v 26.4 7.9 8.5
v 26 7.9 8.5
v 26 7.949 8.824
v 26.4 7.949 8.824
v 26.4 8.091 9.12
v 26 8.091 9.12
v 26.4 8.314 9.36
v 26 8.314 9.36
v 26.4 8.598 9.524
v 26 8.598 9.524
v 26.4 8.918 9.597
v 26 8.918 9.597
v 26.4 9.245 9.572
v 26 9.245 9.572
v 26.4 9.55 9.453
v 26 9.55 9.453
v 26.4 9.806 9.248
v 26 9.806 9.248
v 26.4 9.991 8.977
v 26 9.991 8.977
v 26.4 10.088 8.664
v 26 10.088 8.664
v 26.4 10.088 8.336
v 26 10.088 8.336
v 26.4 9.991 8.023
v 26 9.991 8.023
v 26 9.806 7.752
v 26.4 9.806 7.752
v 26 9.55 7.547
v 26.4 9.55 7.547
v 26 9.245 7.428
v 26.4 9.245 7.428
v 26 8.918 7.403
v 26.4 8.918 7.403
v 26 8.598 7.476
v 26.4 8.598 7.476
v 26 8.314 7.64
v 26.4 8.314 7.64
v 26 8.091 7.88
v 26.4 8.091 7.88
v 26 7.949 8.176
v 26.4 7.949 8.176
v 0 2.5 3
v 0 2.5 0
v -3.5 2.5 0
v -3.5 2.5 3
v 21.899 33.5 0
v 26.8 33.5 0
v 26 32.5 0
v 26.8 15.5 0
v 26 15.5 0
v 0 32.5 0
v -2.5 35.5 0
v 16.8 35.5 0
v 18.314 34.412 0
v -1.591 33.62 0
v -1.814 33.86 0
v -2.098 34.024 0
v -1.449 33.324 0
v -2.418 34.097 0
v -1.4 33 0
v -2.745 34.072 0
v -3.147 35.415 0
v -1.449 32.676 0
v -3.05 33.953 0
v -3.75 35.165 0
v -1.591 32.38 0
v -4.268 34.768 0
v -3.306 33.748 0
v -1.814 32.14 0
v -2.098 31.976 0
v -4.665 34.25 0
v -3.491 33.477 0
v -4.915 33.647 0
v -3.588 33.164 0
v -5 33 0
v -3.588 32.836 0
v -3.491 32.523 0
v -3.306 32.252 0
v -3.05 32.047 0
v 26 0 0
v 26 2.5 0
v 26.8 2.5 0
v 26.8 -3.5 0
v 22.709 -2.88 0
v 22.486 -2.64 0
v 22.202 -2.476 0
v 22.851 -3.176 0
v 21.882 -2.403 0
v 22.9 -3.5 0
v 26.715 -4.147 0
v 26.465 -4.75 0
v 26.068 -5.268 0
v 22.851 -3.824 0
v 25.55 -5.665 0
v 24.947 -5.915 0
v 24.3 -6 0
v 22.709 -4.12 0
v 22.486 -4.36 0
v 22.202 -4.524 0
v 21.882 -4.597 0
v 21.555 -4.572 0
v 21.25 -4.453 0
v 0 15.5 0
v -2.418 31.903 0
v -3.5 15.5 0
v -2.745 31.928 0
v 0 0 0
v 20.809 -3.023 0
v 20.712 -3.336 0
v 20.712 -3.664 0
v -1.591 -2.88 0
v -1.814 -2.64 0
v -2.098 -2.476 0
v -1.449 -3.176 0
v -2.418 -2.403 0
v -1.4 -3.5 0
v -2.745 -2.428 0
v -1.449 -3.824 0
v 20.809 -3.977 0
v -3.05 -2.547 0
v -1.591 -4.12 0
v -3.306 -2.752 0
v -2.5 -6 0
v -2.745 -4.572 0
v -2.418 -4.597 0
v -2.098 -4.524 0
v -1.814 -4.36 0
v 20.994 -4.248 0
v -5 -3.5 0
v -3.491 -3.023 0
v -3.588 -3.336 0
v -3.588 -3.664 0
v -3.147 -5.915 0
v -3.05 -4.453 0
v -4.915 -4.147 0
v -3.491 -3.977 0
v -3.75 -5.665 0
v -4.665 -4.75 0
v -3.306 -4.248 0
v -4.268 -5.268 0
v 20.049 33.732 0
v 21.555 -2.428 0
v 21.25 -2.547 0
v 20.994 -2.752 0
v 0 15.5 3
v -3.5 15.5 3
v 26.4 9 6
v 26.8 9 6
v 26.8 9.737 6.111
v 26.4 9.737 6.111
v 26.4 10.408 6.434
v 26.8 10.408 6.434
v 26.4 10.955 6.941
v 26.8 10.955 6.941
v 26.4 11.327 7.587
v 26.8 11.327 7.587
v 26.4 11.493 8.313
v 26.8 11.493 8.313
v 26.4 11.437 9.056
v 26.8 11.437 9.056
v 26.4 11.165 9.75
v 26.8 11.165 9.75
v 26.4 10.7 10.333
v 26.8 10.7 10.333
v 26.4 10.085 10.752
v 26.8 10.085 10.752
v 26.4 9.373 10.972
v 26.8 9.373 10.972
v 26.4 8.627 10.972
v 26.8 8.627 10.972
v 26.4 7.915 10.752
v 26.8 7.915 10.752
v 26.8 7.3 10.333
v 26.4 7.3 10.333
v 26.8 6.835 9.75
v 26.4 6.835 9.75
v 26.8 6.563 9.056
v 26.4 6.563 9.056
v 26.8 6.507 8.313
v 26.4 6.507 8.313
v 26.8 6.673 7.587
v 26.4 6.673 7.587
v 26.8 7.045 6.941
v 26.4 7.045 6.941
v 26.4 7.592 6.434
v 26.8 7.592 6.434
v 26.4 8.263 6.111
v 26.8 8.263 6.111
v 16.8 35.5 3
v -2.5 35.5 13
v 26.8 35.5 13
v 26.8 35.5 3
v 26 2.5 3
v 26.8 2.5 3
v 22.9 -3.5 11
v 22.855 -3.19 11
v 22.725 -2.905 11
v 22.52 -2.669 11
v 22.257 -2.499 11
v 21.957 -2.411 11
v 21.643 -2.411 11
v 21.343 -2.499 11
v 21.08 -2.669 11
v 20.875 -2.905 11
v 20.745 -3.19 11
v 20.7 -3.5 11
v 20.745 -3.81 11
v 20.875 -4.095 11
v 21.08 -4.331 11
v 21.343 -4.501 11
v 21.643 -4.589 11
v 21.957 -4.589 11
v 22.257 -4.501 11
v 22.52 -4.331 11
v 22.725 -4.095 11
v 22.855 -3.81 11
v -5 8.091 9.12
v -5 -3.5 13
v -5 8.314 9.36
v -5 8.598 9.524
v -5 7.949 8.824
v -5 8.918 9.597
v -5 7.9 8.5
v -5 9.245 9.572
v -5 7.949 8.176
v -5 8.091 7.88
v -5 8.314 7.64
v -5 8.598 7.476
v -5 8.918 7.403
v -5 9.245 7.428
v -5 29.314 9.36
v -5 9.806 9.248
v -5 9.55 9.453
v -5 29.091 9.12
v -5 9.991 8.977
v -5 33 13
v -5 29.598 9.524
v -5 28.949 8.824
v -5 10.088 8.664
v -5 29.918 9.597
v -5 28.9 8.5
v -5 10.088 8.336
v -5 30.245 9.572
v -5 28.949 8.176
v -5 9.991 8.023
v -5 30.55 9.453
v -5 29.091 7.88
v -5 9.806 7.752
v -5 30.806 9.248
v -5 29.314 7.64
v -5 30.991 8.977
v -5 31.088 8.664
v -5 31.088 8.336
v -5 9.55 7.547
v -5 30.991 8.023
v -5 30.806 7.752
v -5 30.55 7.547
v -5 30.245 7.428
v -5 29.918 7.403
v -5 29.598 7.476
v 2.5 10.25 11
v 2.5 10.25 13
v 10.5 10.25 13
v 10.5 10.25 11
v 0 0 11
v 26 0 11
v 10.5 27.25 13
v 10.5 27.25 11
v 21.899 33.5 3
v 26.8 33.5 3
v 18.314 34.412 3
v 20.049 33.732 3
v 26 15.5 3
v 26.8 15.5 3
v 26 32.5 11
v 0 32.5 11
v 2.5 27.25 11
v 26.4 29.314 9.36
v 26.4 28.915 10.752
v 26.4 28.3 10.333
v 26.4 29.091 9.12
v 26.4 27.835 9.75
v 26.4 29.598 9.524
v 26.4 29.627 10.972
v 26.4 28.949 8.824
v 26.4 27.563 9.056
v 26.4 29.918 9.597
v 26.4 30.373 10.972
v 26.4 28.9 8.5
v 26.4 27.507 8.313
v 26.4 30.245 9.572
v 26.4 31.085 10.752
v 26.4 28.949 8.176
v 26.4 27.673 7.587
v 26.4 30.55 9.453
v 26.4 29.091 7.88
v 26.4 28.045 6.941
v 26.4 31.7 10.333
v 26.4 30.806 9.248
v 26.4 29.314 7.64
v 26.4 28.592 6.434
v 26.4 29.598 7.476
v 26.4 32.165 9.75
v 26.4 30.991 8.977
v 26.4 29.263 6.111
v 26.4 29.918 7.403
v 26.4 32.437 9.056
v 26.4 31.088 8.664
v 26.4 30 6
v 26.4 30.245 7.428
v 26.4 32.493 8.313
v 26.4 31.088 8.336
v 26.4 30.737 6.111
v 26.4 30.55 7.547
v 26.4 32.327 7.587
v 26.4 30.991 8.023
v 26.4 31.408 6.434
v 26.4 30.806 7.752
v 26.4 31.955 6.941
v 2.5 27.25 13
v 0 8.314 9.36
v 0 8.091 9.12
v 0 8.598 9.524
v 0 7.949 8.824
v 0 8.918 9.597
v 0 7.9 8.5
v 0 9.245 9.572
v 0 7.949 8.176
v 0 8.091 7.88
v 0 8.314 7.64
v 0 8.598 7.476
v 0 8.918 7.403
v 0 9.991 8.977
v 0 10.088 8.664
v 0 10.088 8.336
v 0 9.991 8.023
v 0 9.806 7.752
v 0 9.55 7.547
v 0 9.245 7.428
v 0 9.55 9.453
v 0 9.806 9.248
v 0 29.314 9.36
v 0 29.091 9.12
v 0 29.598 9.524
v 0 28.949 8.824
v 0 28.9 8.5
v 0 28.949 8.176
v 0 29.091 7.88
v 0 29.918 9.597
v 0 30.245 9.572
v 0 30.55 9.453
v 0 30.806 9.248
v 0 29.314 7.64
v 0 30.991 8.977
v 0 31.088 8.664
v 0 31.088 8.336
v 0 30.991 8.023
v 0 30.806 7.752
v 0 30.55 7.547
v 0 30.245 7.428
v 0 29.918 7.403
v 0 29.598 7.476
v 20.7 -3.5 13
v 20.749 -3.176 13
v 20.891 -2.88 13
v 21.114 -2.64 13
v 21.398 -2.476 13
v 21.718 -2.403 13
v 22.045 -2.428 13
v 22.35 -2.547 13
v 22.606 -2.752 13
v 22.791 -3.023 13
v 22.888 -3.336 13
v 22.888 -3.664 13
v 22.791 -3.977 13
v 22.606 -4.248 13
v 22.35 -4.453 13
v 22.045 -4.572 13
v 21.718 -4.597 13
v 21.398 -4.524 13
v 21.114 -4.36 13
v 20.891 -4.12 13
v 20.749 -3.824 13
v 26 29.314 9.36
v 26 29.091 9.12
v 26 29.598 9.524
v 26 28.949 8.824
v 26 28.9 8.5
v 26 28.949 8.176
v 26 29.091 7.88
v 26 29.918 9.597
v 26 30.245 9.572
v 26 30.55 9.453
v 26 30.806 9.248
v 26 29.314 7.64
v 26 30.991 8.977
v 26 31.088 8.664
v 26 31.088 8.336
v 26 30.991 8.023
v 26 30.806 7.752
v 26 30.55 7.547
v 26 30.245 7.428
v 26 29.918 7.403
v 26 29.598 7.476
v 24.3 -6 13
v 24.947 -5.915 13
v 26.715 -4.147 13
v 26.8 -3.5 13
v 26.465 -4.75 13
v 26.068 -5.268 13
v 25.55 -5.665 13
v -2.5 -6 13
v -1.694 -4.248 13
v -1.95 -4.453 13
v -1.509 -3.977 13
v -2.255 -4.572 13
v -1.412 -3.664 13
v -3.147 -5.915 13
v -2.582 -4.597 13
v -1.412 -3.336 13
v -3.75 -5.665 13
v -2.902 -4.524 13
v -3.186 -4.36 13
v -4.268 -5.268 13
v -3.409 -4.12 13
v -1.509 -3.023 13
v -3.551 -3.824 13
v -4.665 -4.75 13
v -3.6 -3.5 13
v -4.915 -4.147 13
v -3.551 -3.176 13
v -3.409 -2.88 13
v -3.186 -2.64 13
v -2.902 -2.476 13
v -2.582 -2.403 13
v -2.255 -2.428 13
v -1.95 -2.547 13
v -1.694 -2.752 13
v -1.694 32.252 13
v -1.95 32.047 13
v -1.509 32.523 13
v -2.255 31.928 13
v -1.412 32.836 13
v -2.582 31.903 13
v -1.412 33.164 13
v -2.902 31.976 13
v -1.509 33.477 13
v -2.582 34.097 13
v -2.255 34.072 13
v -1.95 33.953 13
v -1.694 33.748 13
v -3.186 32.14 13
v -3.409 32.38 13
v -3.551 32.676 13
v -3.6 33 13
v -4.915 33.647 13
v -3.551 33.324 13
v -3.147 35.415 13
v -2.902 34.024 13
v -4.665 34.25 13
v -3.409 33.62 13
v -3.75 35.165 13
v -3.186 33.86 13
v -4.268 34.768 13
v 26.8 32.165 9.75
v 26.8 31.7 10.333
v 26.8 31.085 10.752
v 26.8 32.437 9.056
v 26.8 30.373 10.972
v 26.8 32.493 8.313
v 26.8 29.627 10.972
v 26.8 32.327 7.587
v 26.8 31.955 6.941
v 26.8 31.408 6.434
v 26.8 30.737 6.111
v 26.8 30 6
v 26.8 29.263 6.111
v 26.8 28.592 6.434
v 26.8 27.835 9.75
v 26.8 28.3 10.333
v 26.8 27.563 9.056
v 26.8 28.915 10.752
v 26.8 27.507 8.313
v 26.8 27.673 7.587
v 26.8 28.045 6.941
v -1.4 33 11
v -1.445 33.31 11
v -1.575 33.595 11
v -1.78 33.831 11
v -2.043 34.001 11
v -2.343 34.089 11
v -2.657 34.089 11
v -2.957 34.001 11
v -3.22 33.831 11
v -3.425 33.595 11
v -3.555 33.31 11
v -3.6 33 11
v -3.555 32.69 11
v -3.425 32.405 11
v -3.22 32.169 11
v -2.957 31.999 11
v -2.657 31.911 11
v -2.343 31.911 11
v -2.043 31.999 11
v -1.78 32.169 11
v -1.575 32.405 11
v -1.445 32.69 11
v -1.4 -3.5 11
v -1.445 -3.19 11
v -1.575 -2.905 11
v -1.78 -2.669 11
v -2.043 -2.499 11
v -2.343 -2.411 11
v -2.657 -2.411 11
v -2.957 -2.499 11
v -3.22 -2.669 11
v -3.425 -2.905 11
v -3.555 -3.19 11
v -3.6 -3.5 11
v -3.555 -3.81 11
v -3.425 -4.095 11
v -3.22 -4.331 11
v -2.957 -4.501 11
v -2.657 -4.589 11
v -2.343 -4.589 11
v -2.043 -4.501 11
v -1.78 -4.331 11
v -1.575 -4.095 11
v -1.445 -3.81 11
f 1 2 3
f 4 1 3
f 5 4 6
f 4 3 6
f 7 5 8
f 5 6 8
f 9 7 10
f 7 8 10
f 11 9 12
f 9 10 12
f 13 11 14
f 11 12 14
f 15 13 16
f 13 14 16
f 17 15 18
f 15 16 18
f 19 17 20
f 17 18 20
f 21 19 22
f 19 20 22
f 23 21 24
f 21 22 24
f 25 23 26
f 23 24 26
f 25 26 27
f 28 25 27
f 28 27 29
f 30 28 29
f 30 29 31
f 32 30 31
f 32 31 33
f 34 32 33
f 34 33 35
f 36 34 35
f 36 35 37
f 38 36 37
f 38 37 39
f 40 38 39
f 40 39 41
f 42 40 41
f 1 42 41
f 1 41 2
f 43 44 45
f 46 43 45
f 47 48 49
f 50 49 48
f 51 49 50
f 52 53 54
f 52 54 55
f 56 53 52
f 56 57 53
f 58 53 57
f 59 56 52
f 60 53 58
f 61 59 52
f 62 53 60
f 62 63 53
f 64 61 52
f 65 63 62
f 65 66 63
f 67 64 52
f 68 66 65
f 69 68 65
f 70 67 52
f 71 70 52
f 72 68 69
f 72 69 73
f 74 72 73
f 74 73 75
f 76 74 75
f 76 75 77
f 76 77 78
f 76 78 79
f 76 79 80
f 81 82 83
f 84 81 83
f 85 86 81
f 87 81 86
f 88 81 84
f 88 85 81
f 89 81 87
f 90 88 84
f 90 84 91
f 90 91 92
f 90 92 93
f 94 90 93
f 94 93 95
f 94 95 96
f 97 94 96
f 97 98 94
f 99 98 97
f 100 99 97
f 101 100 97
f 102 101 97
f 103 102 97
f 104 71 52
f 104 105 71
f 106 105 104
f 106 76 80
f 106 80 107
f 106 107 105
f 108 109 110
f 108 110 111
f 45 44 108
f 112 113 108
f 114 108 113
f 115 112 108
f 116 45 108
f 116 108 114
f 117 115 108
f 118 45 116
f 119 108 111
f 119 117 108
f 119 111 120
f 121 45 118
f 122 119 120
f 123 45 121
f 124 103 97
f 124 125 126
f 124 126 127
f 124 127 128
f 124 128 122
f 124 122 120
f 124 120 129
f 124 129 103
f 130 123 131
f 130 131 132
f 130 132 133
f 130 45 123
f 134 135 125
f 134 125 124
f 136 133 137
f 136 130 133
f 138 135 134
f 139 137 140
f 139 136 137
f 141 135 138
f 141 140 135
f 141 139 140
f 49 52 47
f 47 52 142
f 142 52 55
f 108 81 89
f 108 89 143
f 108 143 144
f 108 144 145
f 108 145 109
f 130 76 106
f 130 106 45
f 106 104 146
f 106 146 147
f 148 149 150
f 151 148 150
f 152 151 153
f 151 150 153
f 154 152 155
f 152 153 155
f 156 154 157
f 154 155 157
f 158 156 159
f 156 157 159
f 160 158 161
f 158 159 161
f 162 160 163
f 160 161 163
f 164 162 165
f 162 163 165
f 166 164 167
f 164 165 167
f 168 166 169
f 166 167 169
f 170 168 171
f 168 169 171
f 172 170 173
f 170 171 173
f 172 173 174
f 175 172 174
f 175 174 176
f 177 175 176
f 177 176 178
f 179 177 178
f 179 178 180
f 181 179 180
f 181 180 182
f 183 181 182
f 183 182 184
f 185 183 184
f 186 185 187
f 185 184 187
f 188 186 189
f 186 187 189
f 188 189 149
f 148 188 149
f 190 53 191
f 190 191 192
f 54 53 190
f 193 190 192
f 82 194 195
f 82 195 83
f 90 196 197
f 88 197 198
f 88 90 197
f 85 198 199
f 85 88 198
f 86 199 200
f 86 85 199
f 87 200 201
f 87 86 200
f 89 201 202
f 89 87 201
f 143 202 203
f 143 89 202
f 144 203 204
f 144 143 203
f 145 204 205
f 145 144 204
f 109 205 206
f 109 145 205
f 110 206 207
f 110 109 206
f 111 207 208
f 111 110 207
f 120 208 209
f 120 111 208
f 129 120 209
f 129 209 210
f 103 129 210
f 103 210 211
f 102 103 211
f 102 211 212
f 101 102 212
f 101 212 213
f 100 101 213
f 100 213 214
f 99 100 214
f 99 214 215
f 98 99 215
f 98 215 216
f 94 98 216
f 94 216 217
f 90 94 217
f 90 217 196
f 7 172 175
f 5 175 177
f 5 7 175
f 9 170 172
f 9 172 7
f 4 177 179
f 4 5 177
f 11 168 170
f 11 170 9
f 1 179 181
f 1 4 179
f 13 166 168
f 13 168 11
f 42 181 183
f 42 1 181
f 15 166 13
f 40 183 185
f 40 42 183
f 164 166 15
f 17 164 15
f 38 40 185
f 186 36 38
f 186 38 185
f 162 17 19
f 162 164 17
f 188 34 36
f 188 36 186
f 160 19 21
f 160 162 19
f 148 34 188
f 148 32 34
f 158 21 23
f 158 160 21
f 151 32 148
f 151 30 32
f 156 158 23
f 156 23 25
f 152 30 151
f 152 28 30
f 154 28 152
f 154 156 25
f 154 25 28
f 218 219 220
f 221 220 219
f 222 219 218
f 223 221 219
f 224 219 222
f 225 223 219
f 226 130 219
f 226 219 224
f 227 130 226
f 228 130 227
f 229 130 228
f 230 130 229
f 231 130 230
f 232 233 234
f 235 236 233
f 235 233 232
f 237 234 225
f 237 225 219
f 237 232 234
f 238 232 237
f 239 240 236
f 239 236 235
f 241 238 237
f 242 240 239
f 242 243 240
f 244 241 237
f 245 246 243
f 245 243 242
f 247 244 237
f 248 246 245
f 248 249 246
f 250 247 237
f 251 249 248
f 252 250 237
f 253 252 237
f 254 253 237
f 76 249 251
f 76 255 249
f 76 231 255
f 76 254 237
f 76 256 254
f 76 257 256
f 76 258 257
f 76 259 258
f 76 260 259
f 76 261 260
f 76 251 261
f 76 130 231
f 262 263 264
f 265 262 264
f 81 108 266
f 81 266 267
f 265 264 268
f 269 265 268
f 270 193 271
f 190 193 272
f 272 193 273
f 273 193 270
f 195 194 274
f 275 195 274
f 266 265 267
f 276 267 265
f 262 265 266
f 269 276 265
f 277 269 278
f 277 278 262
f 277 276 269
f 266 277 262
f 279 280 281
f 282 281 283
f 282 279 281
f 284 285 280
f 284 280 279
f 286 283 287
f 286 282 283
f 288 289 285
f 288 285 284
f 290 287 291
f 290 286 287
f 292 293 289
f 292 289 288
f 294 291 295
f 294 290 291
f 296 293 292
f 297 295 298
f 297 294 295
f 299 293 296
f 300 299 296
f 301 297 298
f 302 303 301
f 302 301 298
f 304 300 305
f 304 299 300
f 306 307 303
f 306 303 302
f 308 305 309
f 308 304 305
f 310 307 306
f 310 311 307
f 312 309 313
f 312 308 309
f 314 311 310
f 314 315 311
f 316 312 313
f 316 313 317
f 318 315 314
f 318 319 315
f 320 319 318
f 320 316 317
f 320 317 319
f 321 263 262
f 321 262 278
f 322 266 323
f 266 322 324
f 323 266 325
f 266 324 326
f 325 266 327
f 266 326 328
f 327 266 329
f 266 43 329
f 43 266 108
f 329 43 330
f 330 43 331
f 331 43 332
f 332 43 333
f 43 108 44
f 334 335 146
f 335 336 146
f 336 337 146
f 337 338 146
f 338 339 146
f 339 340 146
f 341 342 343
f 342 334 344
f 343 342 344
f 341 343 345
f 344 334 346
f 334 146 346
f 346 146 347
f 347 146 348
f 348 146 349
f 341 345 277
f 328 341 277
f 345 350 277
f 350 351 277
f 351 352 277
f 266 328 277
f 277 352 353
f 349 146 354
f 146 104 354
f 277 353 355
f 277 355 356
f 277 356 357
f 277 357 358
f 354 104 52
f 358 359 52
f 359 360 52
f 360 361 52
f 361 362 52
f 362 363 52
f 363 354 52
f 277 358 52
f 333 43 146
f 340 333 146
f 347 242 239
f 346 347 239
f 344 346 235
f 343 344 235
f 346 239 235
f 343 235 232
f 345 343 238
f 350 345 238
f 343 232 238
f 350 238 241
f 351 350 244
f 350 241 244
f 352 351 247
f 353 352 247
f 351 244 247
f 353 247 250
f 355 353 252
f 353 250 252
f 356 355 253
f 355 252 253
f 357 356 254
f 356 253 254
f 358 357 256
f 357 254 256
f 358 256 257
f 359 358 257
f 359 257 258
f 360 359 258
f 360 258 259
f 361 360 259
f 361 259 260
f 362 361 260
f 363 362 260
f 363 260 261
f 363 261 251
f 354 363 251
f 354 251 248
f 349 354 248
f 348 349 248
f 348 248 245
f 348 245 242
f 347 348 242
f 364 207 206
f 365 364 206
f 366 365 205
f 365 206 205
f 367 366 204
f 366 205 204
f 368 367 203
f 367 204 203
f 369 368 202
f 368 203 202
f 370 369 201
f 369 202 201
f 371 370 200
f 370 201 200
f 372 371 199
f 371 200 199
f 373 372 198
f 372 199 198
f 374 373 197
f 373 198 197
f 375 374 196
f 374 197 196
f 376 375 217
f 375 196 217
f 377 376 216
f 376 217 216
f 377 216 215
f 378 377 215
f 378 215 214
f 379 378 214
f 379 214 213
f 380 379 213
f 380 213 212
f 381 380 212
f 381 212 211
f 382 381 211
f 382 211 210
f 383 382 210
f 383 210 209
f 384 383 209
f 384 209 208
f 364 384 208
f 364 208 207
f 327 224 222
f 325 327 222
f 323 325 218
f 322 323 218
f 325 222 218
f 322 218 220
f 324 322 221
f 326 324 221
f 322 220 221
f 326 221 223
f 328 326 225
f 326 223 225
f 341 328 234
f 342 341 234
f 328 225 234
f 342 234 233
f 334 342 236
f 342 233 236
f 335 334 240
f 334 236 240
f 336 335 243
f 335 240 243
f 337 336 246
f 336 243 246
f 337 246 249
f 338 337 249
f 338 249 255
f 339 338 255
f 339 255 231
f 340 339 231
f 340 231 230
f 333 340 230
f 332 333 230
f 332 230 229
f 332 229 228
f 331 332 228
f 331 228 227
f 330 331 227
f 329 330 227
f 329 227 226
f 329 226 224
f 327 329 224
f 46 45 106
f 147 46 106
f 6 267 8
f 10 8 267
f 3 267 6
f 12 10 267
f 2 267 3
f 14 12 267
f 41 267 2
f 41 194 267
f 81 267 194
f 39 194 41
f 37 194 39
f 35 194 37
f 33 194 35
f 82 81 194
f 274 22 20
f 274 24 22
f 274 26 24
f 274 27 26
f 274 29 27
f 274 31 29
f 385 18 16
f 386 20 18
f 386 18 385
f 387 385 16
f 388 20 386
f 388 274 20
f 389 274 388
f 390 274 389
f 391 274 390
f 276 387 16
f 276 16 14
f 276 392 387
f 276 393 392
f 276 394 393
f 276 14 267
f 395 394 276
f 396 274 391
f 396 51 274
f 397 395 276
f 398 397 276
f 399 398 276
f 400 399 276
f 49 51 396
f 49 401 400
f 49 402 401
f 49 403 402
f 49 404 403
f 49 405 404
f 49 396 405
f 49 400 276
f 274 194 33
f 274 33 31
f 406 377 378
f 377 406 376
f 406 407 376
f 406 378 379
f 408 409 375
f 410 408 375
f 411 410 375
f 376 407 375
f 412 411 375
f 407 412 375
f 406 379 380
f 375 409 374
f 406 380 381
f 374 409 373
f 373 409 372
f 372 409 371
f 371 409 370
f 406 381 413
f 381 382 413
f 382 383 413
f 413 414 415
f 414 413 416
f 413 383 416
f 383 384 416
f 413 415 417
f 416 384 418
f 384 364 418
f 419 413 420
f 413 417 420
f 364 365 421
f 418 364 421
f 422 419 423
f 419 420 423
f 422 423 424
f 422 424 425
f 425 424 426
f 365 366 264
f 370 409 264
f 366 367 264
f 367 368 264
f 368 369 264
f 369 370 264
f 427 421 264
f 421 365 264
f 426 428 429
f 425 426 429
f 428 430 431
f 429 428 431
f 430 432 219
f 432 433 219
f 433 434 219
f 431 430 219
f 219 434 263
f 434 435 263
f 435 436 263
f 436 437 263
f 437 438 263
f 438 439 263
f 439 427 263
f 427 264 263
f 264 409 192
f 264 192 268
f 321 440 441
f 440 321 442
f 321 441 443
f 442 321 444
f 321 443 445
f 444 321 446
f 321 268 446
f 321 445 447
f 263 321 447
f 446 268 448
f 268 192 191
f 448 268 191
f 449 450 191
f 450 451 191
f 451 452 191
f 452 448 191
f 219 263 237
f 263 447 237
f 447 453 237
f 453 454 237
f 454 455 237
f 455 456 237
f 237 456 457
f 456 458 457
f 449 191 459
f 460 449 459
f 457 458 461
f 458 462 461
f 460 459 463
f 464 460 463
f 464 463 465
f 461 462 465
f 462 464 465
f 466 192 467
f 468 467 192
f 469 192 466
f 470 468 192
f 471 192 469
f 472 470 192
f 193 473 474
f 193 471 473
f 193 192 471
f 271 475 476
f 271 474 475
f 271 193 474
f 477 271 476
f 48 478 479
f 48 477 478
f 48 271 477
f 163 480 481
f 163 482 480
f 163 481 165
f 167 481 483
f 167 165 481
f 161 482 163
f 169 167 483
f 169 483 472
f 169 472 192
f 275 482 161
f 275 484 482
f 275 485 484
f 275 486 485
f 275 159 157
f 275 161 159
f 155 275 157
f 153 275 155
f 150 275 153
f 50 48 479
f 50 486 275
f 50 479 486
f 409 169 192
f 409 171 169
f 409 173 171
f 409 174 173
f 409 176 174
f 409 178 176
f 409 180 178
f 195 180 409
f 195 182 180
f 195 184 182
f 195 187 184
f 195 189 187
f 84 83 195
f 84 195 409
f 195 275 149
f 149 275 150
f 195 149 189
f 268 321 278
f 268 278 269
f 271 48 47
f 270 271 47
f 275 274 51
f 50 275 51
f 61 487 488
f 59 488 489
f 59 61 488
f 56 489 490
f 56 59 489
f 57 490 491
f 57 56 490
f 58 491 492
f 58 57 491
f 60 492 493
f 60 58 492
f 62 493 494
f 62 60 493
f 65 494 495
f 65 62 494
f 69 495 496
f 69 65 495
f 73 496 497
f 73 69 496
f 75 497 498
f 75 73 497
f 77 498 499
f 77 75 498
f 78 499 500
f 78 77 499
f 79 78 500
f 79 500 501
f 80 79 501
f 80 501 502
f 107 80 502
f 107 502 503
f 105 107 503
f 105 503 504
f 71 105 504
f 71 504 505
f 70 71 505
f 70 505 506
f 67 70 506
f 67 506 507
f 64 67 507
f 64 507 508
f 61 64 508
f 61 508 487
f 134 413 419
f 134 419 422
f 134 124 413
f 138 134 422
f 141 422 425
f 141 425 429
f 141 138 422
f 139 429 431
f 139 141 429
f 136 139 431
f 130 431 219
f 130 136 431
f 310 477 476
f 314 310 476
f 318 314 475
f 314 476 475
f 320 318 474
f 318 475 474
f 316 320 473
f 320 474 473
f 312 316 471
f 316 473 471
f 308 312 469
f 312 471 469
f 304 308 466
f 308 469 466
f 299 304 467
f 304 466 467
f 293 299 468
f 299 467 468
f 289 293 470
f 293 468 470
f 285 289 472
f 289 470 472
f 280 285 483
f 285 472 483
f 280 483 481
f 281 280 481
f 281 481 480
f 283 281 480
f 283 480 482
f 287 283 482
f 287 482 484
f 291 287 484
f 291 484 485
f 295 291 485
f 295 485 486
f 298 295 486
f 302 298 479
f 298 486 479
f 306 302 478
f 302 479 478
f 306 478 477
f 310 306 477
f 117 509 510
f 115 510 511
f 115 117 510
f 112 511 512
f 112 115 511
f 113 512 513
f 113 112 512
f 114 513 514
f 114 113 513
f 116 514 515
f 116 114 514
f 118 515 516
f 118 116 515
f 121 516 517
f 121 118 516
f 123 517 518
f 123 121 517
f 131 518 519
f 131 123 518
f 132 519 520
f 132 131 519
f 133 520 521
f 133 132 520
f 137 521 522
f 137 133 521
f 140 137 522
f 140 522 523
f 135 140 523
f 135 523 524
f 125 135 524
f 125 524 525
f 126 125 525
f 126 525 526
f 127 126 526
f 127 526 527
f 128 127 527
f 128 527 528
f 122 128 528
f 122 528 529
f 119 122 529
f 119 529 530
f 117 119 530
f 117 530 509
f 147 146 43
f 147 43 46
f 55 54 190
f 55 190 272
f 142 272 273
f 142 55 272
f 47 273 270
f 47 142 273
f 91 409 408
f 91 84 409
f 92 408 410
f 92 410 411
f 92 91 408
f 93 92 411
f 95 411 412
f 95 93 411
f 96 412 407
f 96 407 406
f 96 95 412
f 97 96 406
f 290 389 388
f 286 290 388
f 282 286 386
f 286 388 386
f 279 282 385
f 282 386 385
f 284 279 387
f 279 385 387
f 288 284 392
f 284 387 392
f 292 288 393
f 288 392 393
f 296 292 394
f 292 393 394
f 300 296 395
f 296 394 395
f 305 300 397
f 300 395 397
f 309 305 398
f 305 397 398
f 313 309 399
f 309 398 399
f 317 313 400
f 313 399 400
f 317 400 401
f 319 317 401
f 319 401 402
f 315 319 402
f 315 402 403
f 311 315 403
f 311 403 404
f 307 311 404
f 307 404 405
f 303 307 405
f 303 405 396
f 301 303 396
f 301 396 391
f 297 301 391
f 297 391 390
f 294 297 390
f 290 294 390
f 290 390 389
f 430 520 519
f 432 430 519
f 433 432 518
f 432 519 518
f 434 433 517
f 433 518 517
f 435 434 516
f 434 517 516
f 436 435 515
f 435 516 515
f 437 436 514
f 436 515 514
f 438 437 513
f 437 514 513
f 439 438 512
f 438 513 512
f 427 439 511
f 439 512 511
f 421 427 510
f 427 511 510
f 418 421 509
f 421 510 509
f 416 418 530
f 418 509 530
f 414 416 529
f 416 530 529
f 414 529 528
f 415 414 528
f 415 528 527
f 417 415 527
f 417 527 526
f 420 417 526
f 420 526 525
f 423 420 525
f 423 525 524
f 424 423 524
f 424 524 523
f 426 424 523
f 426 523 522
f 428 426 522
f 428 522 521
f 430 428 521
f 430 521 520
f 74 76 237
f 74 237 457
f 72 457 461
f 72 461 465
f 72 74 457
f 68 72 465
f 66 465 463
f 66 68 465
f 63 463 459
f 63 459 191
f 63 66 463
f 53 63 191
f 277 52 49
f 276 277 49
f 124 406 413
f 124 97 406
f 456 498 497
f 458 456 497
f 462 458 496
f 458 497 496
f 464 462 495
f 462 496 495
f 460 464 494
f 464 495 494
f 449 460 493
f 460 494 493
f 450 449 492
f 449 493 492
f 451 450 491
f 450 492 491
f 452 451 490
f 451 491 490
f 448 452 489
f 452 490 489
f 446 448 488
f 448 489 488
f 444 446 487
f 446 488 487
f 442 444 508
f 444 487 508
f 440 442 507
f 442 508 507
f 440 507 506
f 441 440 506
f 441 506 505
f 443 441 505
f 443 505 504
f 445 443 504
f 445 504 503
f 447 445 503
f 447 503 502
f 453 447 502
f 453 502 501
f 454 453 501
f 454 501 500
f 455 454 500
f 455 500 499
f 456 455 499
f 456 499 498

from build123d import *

# Parameters (mm, degrees)
SKETCH_1_R          = 1.1
SKETCH_1_W          = 26
SKETCH_1_H          = 32.5
EXTRUDE_1_DEPTH     = 11
SKETCH_3_R          = 1.1
EXTRUDE_2_DEPTH     = 2
SKETCH_2_R          = 1.1
CUT_EXTRUDE_1_DEPTH = 50.401315772
SKETCH_4_W          = 8
SKETCH_4_H          = 17
CUT_EXTRUDE_3_DEPTH = 10
SKETCH_5_R          = 2.5
CUT_EXTRUDE_4_DEPTH = 0.4
SKETCH_6_W          = 3.5
SKETCH_6_H          = 13
SKETCH_6_W_2        = 10
SKETCH_6_H_2        = 2
CUT_EXTRUDE_6_DEPTH = 3
FILLET_1_R          = 7.5
SKETCH_7_W          = 3
SKETCH_7_H          = 13
CUT_EXTRUDE_7_DEPTH = 49.449355001


with BuildPart() as part:
    # ｽｹｯﾁ1 → ﾎﾞｽ - 押し出し1 (new body)
    with BuildSketch(Plane.XY):
        with BuildLine():
            Line((26.8, 35.5), (26.8, -3.5))
            ThreePointArc((26.8, -3.5), (26.067766953, -5.267766953), (24.3, -6))
            Line((24.3, -6), (-2.5, -6))
            ThreePointArc((-2.5, -6), (-4.267766953, -5.267766953), (-5, -3.5))
            Line((-5, -3.5), (-5, 33))
            ThreePointArc((-5, 33), (-4.267766953, 34.767766953), (-2.5, 35.5))
            Line((-2.5, 35.5), (26.8, 35.5))
        make_face()
        with Locations((-2.5, 33)):
            Circle(SKETCH_1_R, mode=Mode.SUBTRACT)
        with Locations((-2.5, -3.5)):
            Circle(SKETCH_1_R, mode=Mode.SUBTRACT)
        with Locations((21.8, -3.5)):
            Circle(SKETCH_1_R, mode=Mode.SUBTRACT)
        with Locations((13, 16.25)):
            Rectangle(SKETCH_1_W, SKETCH_1_H, mode=Mode.SUBTRACT)
    extrude(amount=EXTRUDE_1_DEPTH)

    # ｽｹｯﾁ3 → ﾎﾞｽ - 押し出し2 (add)
    with BuildSketch(Plane(origin=(0, 0, 11), x_dir=(-1, 0, 0), z_dir=(0, 0, -1))):
        with BuildLine():
            Line((5, -3.5), (5, 33))
            ThreePointArc((5, 33), (4.267766953, 34.767766953), (2.5, 35.5))
            Line((2.5, 35.5), (-26.8, 35.5))
            Line((-26.8, 35.5), (-26.8, -3.5))
            ThreePointArc((-26.8, -3.5), (-26.067766953, -5.267766953), (-24.3, -6))
            Line((-24.3, -6), (2.5, -6))
            ThreePointArc((2.5, -6), (4.267766953, -5.267766953), (5, -3.5))
        make_face()
        with Locations((-21.8, -3.5)):
            Circle(SKETCH_3_R, mode=Mode.SUBTRACT)
        with Locations((2.5, -3.5)):
            Circle(SKETCH_3_R, mode=Mode.SUBTRACT)
        with Locations((2.5, 33)):
            Circle(SKETCH_3_R, mode=Mode.SUBTRACT)
    extrude(amount=-EXTRUDE_2_DEPTH)

    # ｽｹｯﾁ2 → ｶｯﾄ - 押し出し1 (cut, through all)
    with BuildSketch(Plane.ZY.offset(5)):
        with Locations(Location((8.5, 30, 0), (0, 0, 270))):
            Circle(SKETCH_2_R)
        with Locations(Location((8.5, 9, 0), (0, 0, 270))):
            Circle(SKETCH_2_R)
    extrude(amount=-CUT_EXTRUDE_1_DEPTH, mode=Mode.SUBTRACT)

    # ｽｹｯﾁ4 → ｶｯﾄ - 押し出し3 (cut)
    with BuildSketch(Plane.XY.offset(13)):
        with Locations((6.5, 18.75)):
            Rectangle(SKETCH_4_W, SKETCH_4_H)
    extrude(amount=-CUT_EXTRUDE_3_DEPTH, mode=Mode.SUBTRACT)

    # ｽｹｯﾁ5 → ｶｯﾄ - 押し出し4 (cut)
    with BuildSketch(Plane(origin=(26.8, 0, 0), x_dir=(0, 0, -1), z_dir=(1, 0, 0))):
        with Locations((-8.5, 30)):
            Circle(SKETCH_5_R)
        with Locations((-8.5, 9)):
            Circle(SKETCH_5_R)
    extrude(amount=-CUT_EXTRUDE_4_DEPTH, mode=Mode.SUBTRACT)

    # ｽｹｯﾁ6 → ｶｯﾄ - 押し出し6 (cut)
    with BuildSketch(Plane(origin=(0, 0, 0), x_dir=(-1, 0, 0), z_dir=(0, 0, -1))):
        with Locations((1.75, 9)):
            Rectangle(SKETCH_6_W, SKETCH_6_H)
        with Locations((-21.8, 34.5)):
            Rectangle(SKETCH_6_W_2, SKETCH_6_H_2)
    extrude(amount=-CUT_EXTRUDE_6_DEPTH, mode=Mode.SUBTRACT)

    # ﾌｨﾚｯﾄ1
    # the kernel refuses this fillet: 7.5 mm, written as the material it adds along each edge
    with BuildSketch(Plane(origin=(16.8, 33.5, 0), x_dir=(0, 1, 0), z_dir=(0, 0, 1))) as fillet_1_piece_1:
        with BuildLine():
            CenterArc((7.5, -5.099019514), FILLET_1_R, 137.166571934, 42.833428066)
            Line((0, -5.099019514), (0, 0))
            Line((0, 0), (2, 0))
        make_face()
    extrude(amount=3)

    # ｽｹｯﾁ7 → ｶｯﾄ - 押し出し7 (cut, through all)
    with BuildSketch(Plane(origin=(-3.5, 0, 0), x_dir=(0, 0, -1), z_dir=(1, 0, 0))):
        with Locations((-1.5, 9)):
            Rectangle(SKETCH_7_W, SKETCH_7_H)
    extrude(amount=CUT_EXTRUDE_7_DEPTH, mode=Mode.SUBTRACT)


solid = part.part
